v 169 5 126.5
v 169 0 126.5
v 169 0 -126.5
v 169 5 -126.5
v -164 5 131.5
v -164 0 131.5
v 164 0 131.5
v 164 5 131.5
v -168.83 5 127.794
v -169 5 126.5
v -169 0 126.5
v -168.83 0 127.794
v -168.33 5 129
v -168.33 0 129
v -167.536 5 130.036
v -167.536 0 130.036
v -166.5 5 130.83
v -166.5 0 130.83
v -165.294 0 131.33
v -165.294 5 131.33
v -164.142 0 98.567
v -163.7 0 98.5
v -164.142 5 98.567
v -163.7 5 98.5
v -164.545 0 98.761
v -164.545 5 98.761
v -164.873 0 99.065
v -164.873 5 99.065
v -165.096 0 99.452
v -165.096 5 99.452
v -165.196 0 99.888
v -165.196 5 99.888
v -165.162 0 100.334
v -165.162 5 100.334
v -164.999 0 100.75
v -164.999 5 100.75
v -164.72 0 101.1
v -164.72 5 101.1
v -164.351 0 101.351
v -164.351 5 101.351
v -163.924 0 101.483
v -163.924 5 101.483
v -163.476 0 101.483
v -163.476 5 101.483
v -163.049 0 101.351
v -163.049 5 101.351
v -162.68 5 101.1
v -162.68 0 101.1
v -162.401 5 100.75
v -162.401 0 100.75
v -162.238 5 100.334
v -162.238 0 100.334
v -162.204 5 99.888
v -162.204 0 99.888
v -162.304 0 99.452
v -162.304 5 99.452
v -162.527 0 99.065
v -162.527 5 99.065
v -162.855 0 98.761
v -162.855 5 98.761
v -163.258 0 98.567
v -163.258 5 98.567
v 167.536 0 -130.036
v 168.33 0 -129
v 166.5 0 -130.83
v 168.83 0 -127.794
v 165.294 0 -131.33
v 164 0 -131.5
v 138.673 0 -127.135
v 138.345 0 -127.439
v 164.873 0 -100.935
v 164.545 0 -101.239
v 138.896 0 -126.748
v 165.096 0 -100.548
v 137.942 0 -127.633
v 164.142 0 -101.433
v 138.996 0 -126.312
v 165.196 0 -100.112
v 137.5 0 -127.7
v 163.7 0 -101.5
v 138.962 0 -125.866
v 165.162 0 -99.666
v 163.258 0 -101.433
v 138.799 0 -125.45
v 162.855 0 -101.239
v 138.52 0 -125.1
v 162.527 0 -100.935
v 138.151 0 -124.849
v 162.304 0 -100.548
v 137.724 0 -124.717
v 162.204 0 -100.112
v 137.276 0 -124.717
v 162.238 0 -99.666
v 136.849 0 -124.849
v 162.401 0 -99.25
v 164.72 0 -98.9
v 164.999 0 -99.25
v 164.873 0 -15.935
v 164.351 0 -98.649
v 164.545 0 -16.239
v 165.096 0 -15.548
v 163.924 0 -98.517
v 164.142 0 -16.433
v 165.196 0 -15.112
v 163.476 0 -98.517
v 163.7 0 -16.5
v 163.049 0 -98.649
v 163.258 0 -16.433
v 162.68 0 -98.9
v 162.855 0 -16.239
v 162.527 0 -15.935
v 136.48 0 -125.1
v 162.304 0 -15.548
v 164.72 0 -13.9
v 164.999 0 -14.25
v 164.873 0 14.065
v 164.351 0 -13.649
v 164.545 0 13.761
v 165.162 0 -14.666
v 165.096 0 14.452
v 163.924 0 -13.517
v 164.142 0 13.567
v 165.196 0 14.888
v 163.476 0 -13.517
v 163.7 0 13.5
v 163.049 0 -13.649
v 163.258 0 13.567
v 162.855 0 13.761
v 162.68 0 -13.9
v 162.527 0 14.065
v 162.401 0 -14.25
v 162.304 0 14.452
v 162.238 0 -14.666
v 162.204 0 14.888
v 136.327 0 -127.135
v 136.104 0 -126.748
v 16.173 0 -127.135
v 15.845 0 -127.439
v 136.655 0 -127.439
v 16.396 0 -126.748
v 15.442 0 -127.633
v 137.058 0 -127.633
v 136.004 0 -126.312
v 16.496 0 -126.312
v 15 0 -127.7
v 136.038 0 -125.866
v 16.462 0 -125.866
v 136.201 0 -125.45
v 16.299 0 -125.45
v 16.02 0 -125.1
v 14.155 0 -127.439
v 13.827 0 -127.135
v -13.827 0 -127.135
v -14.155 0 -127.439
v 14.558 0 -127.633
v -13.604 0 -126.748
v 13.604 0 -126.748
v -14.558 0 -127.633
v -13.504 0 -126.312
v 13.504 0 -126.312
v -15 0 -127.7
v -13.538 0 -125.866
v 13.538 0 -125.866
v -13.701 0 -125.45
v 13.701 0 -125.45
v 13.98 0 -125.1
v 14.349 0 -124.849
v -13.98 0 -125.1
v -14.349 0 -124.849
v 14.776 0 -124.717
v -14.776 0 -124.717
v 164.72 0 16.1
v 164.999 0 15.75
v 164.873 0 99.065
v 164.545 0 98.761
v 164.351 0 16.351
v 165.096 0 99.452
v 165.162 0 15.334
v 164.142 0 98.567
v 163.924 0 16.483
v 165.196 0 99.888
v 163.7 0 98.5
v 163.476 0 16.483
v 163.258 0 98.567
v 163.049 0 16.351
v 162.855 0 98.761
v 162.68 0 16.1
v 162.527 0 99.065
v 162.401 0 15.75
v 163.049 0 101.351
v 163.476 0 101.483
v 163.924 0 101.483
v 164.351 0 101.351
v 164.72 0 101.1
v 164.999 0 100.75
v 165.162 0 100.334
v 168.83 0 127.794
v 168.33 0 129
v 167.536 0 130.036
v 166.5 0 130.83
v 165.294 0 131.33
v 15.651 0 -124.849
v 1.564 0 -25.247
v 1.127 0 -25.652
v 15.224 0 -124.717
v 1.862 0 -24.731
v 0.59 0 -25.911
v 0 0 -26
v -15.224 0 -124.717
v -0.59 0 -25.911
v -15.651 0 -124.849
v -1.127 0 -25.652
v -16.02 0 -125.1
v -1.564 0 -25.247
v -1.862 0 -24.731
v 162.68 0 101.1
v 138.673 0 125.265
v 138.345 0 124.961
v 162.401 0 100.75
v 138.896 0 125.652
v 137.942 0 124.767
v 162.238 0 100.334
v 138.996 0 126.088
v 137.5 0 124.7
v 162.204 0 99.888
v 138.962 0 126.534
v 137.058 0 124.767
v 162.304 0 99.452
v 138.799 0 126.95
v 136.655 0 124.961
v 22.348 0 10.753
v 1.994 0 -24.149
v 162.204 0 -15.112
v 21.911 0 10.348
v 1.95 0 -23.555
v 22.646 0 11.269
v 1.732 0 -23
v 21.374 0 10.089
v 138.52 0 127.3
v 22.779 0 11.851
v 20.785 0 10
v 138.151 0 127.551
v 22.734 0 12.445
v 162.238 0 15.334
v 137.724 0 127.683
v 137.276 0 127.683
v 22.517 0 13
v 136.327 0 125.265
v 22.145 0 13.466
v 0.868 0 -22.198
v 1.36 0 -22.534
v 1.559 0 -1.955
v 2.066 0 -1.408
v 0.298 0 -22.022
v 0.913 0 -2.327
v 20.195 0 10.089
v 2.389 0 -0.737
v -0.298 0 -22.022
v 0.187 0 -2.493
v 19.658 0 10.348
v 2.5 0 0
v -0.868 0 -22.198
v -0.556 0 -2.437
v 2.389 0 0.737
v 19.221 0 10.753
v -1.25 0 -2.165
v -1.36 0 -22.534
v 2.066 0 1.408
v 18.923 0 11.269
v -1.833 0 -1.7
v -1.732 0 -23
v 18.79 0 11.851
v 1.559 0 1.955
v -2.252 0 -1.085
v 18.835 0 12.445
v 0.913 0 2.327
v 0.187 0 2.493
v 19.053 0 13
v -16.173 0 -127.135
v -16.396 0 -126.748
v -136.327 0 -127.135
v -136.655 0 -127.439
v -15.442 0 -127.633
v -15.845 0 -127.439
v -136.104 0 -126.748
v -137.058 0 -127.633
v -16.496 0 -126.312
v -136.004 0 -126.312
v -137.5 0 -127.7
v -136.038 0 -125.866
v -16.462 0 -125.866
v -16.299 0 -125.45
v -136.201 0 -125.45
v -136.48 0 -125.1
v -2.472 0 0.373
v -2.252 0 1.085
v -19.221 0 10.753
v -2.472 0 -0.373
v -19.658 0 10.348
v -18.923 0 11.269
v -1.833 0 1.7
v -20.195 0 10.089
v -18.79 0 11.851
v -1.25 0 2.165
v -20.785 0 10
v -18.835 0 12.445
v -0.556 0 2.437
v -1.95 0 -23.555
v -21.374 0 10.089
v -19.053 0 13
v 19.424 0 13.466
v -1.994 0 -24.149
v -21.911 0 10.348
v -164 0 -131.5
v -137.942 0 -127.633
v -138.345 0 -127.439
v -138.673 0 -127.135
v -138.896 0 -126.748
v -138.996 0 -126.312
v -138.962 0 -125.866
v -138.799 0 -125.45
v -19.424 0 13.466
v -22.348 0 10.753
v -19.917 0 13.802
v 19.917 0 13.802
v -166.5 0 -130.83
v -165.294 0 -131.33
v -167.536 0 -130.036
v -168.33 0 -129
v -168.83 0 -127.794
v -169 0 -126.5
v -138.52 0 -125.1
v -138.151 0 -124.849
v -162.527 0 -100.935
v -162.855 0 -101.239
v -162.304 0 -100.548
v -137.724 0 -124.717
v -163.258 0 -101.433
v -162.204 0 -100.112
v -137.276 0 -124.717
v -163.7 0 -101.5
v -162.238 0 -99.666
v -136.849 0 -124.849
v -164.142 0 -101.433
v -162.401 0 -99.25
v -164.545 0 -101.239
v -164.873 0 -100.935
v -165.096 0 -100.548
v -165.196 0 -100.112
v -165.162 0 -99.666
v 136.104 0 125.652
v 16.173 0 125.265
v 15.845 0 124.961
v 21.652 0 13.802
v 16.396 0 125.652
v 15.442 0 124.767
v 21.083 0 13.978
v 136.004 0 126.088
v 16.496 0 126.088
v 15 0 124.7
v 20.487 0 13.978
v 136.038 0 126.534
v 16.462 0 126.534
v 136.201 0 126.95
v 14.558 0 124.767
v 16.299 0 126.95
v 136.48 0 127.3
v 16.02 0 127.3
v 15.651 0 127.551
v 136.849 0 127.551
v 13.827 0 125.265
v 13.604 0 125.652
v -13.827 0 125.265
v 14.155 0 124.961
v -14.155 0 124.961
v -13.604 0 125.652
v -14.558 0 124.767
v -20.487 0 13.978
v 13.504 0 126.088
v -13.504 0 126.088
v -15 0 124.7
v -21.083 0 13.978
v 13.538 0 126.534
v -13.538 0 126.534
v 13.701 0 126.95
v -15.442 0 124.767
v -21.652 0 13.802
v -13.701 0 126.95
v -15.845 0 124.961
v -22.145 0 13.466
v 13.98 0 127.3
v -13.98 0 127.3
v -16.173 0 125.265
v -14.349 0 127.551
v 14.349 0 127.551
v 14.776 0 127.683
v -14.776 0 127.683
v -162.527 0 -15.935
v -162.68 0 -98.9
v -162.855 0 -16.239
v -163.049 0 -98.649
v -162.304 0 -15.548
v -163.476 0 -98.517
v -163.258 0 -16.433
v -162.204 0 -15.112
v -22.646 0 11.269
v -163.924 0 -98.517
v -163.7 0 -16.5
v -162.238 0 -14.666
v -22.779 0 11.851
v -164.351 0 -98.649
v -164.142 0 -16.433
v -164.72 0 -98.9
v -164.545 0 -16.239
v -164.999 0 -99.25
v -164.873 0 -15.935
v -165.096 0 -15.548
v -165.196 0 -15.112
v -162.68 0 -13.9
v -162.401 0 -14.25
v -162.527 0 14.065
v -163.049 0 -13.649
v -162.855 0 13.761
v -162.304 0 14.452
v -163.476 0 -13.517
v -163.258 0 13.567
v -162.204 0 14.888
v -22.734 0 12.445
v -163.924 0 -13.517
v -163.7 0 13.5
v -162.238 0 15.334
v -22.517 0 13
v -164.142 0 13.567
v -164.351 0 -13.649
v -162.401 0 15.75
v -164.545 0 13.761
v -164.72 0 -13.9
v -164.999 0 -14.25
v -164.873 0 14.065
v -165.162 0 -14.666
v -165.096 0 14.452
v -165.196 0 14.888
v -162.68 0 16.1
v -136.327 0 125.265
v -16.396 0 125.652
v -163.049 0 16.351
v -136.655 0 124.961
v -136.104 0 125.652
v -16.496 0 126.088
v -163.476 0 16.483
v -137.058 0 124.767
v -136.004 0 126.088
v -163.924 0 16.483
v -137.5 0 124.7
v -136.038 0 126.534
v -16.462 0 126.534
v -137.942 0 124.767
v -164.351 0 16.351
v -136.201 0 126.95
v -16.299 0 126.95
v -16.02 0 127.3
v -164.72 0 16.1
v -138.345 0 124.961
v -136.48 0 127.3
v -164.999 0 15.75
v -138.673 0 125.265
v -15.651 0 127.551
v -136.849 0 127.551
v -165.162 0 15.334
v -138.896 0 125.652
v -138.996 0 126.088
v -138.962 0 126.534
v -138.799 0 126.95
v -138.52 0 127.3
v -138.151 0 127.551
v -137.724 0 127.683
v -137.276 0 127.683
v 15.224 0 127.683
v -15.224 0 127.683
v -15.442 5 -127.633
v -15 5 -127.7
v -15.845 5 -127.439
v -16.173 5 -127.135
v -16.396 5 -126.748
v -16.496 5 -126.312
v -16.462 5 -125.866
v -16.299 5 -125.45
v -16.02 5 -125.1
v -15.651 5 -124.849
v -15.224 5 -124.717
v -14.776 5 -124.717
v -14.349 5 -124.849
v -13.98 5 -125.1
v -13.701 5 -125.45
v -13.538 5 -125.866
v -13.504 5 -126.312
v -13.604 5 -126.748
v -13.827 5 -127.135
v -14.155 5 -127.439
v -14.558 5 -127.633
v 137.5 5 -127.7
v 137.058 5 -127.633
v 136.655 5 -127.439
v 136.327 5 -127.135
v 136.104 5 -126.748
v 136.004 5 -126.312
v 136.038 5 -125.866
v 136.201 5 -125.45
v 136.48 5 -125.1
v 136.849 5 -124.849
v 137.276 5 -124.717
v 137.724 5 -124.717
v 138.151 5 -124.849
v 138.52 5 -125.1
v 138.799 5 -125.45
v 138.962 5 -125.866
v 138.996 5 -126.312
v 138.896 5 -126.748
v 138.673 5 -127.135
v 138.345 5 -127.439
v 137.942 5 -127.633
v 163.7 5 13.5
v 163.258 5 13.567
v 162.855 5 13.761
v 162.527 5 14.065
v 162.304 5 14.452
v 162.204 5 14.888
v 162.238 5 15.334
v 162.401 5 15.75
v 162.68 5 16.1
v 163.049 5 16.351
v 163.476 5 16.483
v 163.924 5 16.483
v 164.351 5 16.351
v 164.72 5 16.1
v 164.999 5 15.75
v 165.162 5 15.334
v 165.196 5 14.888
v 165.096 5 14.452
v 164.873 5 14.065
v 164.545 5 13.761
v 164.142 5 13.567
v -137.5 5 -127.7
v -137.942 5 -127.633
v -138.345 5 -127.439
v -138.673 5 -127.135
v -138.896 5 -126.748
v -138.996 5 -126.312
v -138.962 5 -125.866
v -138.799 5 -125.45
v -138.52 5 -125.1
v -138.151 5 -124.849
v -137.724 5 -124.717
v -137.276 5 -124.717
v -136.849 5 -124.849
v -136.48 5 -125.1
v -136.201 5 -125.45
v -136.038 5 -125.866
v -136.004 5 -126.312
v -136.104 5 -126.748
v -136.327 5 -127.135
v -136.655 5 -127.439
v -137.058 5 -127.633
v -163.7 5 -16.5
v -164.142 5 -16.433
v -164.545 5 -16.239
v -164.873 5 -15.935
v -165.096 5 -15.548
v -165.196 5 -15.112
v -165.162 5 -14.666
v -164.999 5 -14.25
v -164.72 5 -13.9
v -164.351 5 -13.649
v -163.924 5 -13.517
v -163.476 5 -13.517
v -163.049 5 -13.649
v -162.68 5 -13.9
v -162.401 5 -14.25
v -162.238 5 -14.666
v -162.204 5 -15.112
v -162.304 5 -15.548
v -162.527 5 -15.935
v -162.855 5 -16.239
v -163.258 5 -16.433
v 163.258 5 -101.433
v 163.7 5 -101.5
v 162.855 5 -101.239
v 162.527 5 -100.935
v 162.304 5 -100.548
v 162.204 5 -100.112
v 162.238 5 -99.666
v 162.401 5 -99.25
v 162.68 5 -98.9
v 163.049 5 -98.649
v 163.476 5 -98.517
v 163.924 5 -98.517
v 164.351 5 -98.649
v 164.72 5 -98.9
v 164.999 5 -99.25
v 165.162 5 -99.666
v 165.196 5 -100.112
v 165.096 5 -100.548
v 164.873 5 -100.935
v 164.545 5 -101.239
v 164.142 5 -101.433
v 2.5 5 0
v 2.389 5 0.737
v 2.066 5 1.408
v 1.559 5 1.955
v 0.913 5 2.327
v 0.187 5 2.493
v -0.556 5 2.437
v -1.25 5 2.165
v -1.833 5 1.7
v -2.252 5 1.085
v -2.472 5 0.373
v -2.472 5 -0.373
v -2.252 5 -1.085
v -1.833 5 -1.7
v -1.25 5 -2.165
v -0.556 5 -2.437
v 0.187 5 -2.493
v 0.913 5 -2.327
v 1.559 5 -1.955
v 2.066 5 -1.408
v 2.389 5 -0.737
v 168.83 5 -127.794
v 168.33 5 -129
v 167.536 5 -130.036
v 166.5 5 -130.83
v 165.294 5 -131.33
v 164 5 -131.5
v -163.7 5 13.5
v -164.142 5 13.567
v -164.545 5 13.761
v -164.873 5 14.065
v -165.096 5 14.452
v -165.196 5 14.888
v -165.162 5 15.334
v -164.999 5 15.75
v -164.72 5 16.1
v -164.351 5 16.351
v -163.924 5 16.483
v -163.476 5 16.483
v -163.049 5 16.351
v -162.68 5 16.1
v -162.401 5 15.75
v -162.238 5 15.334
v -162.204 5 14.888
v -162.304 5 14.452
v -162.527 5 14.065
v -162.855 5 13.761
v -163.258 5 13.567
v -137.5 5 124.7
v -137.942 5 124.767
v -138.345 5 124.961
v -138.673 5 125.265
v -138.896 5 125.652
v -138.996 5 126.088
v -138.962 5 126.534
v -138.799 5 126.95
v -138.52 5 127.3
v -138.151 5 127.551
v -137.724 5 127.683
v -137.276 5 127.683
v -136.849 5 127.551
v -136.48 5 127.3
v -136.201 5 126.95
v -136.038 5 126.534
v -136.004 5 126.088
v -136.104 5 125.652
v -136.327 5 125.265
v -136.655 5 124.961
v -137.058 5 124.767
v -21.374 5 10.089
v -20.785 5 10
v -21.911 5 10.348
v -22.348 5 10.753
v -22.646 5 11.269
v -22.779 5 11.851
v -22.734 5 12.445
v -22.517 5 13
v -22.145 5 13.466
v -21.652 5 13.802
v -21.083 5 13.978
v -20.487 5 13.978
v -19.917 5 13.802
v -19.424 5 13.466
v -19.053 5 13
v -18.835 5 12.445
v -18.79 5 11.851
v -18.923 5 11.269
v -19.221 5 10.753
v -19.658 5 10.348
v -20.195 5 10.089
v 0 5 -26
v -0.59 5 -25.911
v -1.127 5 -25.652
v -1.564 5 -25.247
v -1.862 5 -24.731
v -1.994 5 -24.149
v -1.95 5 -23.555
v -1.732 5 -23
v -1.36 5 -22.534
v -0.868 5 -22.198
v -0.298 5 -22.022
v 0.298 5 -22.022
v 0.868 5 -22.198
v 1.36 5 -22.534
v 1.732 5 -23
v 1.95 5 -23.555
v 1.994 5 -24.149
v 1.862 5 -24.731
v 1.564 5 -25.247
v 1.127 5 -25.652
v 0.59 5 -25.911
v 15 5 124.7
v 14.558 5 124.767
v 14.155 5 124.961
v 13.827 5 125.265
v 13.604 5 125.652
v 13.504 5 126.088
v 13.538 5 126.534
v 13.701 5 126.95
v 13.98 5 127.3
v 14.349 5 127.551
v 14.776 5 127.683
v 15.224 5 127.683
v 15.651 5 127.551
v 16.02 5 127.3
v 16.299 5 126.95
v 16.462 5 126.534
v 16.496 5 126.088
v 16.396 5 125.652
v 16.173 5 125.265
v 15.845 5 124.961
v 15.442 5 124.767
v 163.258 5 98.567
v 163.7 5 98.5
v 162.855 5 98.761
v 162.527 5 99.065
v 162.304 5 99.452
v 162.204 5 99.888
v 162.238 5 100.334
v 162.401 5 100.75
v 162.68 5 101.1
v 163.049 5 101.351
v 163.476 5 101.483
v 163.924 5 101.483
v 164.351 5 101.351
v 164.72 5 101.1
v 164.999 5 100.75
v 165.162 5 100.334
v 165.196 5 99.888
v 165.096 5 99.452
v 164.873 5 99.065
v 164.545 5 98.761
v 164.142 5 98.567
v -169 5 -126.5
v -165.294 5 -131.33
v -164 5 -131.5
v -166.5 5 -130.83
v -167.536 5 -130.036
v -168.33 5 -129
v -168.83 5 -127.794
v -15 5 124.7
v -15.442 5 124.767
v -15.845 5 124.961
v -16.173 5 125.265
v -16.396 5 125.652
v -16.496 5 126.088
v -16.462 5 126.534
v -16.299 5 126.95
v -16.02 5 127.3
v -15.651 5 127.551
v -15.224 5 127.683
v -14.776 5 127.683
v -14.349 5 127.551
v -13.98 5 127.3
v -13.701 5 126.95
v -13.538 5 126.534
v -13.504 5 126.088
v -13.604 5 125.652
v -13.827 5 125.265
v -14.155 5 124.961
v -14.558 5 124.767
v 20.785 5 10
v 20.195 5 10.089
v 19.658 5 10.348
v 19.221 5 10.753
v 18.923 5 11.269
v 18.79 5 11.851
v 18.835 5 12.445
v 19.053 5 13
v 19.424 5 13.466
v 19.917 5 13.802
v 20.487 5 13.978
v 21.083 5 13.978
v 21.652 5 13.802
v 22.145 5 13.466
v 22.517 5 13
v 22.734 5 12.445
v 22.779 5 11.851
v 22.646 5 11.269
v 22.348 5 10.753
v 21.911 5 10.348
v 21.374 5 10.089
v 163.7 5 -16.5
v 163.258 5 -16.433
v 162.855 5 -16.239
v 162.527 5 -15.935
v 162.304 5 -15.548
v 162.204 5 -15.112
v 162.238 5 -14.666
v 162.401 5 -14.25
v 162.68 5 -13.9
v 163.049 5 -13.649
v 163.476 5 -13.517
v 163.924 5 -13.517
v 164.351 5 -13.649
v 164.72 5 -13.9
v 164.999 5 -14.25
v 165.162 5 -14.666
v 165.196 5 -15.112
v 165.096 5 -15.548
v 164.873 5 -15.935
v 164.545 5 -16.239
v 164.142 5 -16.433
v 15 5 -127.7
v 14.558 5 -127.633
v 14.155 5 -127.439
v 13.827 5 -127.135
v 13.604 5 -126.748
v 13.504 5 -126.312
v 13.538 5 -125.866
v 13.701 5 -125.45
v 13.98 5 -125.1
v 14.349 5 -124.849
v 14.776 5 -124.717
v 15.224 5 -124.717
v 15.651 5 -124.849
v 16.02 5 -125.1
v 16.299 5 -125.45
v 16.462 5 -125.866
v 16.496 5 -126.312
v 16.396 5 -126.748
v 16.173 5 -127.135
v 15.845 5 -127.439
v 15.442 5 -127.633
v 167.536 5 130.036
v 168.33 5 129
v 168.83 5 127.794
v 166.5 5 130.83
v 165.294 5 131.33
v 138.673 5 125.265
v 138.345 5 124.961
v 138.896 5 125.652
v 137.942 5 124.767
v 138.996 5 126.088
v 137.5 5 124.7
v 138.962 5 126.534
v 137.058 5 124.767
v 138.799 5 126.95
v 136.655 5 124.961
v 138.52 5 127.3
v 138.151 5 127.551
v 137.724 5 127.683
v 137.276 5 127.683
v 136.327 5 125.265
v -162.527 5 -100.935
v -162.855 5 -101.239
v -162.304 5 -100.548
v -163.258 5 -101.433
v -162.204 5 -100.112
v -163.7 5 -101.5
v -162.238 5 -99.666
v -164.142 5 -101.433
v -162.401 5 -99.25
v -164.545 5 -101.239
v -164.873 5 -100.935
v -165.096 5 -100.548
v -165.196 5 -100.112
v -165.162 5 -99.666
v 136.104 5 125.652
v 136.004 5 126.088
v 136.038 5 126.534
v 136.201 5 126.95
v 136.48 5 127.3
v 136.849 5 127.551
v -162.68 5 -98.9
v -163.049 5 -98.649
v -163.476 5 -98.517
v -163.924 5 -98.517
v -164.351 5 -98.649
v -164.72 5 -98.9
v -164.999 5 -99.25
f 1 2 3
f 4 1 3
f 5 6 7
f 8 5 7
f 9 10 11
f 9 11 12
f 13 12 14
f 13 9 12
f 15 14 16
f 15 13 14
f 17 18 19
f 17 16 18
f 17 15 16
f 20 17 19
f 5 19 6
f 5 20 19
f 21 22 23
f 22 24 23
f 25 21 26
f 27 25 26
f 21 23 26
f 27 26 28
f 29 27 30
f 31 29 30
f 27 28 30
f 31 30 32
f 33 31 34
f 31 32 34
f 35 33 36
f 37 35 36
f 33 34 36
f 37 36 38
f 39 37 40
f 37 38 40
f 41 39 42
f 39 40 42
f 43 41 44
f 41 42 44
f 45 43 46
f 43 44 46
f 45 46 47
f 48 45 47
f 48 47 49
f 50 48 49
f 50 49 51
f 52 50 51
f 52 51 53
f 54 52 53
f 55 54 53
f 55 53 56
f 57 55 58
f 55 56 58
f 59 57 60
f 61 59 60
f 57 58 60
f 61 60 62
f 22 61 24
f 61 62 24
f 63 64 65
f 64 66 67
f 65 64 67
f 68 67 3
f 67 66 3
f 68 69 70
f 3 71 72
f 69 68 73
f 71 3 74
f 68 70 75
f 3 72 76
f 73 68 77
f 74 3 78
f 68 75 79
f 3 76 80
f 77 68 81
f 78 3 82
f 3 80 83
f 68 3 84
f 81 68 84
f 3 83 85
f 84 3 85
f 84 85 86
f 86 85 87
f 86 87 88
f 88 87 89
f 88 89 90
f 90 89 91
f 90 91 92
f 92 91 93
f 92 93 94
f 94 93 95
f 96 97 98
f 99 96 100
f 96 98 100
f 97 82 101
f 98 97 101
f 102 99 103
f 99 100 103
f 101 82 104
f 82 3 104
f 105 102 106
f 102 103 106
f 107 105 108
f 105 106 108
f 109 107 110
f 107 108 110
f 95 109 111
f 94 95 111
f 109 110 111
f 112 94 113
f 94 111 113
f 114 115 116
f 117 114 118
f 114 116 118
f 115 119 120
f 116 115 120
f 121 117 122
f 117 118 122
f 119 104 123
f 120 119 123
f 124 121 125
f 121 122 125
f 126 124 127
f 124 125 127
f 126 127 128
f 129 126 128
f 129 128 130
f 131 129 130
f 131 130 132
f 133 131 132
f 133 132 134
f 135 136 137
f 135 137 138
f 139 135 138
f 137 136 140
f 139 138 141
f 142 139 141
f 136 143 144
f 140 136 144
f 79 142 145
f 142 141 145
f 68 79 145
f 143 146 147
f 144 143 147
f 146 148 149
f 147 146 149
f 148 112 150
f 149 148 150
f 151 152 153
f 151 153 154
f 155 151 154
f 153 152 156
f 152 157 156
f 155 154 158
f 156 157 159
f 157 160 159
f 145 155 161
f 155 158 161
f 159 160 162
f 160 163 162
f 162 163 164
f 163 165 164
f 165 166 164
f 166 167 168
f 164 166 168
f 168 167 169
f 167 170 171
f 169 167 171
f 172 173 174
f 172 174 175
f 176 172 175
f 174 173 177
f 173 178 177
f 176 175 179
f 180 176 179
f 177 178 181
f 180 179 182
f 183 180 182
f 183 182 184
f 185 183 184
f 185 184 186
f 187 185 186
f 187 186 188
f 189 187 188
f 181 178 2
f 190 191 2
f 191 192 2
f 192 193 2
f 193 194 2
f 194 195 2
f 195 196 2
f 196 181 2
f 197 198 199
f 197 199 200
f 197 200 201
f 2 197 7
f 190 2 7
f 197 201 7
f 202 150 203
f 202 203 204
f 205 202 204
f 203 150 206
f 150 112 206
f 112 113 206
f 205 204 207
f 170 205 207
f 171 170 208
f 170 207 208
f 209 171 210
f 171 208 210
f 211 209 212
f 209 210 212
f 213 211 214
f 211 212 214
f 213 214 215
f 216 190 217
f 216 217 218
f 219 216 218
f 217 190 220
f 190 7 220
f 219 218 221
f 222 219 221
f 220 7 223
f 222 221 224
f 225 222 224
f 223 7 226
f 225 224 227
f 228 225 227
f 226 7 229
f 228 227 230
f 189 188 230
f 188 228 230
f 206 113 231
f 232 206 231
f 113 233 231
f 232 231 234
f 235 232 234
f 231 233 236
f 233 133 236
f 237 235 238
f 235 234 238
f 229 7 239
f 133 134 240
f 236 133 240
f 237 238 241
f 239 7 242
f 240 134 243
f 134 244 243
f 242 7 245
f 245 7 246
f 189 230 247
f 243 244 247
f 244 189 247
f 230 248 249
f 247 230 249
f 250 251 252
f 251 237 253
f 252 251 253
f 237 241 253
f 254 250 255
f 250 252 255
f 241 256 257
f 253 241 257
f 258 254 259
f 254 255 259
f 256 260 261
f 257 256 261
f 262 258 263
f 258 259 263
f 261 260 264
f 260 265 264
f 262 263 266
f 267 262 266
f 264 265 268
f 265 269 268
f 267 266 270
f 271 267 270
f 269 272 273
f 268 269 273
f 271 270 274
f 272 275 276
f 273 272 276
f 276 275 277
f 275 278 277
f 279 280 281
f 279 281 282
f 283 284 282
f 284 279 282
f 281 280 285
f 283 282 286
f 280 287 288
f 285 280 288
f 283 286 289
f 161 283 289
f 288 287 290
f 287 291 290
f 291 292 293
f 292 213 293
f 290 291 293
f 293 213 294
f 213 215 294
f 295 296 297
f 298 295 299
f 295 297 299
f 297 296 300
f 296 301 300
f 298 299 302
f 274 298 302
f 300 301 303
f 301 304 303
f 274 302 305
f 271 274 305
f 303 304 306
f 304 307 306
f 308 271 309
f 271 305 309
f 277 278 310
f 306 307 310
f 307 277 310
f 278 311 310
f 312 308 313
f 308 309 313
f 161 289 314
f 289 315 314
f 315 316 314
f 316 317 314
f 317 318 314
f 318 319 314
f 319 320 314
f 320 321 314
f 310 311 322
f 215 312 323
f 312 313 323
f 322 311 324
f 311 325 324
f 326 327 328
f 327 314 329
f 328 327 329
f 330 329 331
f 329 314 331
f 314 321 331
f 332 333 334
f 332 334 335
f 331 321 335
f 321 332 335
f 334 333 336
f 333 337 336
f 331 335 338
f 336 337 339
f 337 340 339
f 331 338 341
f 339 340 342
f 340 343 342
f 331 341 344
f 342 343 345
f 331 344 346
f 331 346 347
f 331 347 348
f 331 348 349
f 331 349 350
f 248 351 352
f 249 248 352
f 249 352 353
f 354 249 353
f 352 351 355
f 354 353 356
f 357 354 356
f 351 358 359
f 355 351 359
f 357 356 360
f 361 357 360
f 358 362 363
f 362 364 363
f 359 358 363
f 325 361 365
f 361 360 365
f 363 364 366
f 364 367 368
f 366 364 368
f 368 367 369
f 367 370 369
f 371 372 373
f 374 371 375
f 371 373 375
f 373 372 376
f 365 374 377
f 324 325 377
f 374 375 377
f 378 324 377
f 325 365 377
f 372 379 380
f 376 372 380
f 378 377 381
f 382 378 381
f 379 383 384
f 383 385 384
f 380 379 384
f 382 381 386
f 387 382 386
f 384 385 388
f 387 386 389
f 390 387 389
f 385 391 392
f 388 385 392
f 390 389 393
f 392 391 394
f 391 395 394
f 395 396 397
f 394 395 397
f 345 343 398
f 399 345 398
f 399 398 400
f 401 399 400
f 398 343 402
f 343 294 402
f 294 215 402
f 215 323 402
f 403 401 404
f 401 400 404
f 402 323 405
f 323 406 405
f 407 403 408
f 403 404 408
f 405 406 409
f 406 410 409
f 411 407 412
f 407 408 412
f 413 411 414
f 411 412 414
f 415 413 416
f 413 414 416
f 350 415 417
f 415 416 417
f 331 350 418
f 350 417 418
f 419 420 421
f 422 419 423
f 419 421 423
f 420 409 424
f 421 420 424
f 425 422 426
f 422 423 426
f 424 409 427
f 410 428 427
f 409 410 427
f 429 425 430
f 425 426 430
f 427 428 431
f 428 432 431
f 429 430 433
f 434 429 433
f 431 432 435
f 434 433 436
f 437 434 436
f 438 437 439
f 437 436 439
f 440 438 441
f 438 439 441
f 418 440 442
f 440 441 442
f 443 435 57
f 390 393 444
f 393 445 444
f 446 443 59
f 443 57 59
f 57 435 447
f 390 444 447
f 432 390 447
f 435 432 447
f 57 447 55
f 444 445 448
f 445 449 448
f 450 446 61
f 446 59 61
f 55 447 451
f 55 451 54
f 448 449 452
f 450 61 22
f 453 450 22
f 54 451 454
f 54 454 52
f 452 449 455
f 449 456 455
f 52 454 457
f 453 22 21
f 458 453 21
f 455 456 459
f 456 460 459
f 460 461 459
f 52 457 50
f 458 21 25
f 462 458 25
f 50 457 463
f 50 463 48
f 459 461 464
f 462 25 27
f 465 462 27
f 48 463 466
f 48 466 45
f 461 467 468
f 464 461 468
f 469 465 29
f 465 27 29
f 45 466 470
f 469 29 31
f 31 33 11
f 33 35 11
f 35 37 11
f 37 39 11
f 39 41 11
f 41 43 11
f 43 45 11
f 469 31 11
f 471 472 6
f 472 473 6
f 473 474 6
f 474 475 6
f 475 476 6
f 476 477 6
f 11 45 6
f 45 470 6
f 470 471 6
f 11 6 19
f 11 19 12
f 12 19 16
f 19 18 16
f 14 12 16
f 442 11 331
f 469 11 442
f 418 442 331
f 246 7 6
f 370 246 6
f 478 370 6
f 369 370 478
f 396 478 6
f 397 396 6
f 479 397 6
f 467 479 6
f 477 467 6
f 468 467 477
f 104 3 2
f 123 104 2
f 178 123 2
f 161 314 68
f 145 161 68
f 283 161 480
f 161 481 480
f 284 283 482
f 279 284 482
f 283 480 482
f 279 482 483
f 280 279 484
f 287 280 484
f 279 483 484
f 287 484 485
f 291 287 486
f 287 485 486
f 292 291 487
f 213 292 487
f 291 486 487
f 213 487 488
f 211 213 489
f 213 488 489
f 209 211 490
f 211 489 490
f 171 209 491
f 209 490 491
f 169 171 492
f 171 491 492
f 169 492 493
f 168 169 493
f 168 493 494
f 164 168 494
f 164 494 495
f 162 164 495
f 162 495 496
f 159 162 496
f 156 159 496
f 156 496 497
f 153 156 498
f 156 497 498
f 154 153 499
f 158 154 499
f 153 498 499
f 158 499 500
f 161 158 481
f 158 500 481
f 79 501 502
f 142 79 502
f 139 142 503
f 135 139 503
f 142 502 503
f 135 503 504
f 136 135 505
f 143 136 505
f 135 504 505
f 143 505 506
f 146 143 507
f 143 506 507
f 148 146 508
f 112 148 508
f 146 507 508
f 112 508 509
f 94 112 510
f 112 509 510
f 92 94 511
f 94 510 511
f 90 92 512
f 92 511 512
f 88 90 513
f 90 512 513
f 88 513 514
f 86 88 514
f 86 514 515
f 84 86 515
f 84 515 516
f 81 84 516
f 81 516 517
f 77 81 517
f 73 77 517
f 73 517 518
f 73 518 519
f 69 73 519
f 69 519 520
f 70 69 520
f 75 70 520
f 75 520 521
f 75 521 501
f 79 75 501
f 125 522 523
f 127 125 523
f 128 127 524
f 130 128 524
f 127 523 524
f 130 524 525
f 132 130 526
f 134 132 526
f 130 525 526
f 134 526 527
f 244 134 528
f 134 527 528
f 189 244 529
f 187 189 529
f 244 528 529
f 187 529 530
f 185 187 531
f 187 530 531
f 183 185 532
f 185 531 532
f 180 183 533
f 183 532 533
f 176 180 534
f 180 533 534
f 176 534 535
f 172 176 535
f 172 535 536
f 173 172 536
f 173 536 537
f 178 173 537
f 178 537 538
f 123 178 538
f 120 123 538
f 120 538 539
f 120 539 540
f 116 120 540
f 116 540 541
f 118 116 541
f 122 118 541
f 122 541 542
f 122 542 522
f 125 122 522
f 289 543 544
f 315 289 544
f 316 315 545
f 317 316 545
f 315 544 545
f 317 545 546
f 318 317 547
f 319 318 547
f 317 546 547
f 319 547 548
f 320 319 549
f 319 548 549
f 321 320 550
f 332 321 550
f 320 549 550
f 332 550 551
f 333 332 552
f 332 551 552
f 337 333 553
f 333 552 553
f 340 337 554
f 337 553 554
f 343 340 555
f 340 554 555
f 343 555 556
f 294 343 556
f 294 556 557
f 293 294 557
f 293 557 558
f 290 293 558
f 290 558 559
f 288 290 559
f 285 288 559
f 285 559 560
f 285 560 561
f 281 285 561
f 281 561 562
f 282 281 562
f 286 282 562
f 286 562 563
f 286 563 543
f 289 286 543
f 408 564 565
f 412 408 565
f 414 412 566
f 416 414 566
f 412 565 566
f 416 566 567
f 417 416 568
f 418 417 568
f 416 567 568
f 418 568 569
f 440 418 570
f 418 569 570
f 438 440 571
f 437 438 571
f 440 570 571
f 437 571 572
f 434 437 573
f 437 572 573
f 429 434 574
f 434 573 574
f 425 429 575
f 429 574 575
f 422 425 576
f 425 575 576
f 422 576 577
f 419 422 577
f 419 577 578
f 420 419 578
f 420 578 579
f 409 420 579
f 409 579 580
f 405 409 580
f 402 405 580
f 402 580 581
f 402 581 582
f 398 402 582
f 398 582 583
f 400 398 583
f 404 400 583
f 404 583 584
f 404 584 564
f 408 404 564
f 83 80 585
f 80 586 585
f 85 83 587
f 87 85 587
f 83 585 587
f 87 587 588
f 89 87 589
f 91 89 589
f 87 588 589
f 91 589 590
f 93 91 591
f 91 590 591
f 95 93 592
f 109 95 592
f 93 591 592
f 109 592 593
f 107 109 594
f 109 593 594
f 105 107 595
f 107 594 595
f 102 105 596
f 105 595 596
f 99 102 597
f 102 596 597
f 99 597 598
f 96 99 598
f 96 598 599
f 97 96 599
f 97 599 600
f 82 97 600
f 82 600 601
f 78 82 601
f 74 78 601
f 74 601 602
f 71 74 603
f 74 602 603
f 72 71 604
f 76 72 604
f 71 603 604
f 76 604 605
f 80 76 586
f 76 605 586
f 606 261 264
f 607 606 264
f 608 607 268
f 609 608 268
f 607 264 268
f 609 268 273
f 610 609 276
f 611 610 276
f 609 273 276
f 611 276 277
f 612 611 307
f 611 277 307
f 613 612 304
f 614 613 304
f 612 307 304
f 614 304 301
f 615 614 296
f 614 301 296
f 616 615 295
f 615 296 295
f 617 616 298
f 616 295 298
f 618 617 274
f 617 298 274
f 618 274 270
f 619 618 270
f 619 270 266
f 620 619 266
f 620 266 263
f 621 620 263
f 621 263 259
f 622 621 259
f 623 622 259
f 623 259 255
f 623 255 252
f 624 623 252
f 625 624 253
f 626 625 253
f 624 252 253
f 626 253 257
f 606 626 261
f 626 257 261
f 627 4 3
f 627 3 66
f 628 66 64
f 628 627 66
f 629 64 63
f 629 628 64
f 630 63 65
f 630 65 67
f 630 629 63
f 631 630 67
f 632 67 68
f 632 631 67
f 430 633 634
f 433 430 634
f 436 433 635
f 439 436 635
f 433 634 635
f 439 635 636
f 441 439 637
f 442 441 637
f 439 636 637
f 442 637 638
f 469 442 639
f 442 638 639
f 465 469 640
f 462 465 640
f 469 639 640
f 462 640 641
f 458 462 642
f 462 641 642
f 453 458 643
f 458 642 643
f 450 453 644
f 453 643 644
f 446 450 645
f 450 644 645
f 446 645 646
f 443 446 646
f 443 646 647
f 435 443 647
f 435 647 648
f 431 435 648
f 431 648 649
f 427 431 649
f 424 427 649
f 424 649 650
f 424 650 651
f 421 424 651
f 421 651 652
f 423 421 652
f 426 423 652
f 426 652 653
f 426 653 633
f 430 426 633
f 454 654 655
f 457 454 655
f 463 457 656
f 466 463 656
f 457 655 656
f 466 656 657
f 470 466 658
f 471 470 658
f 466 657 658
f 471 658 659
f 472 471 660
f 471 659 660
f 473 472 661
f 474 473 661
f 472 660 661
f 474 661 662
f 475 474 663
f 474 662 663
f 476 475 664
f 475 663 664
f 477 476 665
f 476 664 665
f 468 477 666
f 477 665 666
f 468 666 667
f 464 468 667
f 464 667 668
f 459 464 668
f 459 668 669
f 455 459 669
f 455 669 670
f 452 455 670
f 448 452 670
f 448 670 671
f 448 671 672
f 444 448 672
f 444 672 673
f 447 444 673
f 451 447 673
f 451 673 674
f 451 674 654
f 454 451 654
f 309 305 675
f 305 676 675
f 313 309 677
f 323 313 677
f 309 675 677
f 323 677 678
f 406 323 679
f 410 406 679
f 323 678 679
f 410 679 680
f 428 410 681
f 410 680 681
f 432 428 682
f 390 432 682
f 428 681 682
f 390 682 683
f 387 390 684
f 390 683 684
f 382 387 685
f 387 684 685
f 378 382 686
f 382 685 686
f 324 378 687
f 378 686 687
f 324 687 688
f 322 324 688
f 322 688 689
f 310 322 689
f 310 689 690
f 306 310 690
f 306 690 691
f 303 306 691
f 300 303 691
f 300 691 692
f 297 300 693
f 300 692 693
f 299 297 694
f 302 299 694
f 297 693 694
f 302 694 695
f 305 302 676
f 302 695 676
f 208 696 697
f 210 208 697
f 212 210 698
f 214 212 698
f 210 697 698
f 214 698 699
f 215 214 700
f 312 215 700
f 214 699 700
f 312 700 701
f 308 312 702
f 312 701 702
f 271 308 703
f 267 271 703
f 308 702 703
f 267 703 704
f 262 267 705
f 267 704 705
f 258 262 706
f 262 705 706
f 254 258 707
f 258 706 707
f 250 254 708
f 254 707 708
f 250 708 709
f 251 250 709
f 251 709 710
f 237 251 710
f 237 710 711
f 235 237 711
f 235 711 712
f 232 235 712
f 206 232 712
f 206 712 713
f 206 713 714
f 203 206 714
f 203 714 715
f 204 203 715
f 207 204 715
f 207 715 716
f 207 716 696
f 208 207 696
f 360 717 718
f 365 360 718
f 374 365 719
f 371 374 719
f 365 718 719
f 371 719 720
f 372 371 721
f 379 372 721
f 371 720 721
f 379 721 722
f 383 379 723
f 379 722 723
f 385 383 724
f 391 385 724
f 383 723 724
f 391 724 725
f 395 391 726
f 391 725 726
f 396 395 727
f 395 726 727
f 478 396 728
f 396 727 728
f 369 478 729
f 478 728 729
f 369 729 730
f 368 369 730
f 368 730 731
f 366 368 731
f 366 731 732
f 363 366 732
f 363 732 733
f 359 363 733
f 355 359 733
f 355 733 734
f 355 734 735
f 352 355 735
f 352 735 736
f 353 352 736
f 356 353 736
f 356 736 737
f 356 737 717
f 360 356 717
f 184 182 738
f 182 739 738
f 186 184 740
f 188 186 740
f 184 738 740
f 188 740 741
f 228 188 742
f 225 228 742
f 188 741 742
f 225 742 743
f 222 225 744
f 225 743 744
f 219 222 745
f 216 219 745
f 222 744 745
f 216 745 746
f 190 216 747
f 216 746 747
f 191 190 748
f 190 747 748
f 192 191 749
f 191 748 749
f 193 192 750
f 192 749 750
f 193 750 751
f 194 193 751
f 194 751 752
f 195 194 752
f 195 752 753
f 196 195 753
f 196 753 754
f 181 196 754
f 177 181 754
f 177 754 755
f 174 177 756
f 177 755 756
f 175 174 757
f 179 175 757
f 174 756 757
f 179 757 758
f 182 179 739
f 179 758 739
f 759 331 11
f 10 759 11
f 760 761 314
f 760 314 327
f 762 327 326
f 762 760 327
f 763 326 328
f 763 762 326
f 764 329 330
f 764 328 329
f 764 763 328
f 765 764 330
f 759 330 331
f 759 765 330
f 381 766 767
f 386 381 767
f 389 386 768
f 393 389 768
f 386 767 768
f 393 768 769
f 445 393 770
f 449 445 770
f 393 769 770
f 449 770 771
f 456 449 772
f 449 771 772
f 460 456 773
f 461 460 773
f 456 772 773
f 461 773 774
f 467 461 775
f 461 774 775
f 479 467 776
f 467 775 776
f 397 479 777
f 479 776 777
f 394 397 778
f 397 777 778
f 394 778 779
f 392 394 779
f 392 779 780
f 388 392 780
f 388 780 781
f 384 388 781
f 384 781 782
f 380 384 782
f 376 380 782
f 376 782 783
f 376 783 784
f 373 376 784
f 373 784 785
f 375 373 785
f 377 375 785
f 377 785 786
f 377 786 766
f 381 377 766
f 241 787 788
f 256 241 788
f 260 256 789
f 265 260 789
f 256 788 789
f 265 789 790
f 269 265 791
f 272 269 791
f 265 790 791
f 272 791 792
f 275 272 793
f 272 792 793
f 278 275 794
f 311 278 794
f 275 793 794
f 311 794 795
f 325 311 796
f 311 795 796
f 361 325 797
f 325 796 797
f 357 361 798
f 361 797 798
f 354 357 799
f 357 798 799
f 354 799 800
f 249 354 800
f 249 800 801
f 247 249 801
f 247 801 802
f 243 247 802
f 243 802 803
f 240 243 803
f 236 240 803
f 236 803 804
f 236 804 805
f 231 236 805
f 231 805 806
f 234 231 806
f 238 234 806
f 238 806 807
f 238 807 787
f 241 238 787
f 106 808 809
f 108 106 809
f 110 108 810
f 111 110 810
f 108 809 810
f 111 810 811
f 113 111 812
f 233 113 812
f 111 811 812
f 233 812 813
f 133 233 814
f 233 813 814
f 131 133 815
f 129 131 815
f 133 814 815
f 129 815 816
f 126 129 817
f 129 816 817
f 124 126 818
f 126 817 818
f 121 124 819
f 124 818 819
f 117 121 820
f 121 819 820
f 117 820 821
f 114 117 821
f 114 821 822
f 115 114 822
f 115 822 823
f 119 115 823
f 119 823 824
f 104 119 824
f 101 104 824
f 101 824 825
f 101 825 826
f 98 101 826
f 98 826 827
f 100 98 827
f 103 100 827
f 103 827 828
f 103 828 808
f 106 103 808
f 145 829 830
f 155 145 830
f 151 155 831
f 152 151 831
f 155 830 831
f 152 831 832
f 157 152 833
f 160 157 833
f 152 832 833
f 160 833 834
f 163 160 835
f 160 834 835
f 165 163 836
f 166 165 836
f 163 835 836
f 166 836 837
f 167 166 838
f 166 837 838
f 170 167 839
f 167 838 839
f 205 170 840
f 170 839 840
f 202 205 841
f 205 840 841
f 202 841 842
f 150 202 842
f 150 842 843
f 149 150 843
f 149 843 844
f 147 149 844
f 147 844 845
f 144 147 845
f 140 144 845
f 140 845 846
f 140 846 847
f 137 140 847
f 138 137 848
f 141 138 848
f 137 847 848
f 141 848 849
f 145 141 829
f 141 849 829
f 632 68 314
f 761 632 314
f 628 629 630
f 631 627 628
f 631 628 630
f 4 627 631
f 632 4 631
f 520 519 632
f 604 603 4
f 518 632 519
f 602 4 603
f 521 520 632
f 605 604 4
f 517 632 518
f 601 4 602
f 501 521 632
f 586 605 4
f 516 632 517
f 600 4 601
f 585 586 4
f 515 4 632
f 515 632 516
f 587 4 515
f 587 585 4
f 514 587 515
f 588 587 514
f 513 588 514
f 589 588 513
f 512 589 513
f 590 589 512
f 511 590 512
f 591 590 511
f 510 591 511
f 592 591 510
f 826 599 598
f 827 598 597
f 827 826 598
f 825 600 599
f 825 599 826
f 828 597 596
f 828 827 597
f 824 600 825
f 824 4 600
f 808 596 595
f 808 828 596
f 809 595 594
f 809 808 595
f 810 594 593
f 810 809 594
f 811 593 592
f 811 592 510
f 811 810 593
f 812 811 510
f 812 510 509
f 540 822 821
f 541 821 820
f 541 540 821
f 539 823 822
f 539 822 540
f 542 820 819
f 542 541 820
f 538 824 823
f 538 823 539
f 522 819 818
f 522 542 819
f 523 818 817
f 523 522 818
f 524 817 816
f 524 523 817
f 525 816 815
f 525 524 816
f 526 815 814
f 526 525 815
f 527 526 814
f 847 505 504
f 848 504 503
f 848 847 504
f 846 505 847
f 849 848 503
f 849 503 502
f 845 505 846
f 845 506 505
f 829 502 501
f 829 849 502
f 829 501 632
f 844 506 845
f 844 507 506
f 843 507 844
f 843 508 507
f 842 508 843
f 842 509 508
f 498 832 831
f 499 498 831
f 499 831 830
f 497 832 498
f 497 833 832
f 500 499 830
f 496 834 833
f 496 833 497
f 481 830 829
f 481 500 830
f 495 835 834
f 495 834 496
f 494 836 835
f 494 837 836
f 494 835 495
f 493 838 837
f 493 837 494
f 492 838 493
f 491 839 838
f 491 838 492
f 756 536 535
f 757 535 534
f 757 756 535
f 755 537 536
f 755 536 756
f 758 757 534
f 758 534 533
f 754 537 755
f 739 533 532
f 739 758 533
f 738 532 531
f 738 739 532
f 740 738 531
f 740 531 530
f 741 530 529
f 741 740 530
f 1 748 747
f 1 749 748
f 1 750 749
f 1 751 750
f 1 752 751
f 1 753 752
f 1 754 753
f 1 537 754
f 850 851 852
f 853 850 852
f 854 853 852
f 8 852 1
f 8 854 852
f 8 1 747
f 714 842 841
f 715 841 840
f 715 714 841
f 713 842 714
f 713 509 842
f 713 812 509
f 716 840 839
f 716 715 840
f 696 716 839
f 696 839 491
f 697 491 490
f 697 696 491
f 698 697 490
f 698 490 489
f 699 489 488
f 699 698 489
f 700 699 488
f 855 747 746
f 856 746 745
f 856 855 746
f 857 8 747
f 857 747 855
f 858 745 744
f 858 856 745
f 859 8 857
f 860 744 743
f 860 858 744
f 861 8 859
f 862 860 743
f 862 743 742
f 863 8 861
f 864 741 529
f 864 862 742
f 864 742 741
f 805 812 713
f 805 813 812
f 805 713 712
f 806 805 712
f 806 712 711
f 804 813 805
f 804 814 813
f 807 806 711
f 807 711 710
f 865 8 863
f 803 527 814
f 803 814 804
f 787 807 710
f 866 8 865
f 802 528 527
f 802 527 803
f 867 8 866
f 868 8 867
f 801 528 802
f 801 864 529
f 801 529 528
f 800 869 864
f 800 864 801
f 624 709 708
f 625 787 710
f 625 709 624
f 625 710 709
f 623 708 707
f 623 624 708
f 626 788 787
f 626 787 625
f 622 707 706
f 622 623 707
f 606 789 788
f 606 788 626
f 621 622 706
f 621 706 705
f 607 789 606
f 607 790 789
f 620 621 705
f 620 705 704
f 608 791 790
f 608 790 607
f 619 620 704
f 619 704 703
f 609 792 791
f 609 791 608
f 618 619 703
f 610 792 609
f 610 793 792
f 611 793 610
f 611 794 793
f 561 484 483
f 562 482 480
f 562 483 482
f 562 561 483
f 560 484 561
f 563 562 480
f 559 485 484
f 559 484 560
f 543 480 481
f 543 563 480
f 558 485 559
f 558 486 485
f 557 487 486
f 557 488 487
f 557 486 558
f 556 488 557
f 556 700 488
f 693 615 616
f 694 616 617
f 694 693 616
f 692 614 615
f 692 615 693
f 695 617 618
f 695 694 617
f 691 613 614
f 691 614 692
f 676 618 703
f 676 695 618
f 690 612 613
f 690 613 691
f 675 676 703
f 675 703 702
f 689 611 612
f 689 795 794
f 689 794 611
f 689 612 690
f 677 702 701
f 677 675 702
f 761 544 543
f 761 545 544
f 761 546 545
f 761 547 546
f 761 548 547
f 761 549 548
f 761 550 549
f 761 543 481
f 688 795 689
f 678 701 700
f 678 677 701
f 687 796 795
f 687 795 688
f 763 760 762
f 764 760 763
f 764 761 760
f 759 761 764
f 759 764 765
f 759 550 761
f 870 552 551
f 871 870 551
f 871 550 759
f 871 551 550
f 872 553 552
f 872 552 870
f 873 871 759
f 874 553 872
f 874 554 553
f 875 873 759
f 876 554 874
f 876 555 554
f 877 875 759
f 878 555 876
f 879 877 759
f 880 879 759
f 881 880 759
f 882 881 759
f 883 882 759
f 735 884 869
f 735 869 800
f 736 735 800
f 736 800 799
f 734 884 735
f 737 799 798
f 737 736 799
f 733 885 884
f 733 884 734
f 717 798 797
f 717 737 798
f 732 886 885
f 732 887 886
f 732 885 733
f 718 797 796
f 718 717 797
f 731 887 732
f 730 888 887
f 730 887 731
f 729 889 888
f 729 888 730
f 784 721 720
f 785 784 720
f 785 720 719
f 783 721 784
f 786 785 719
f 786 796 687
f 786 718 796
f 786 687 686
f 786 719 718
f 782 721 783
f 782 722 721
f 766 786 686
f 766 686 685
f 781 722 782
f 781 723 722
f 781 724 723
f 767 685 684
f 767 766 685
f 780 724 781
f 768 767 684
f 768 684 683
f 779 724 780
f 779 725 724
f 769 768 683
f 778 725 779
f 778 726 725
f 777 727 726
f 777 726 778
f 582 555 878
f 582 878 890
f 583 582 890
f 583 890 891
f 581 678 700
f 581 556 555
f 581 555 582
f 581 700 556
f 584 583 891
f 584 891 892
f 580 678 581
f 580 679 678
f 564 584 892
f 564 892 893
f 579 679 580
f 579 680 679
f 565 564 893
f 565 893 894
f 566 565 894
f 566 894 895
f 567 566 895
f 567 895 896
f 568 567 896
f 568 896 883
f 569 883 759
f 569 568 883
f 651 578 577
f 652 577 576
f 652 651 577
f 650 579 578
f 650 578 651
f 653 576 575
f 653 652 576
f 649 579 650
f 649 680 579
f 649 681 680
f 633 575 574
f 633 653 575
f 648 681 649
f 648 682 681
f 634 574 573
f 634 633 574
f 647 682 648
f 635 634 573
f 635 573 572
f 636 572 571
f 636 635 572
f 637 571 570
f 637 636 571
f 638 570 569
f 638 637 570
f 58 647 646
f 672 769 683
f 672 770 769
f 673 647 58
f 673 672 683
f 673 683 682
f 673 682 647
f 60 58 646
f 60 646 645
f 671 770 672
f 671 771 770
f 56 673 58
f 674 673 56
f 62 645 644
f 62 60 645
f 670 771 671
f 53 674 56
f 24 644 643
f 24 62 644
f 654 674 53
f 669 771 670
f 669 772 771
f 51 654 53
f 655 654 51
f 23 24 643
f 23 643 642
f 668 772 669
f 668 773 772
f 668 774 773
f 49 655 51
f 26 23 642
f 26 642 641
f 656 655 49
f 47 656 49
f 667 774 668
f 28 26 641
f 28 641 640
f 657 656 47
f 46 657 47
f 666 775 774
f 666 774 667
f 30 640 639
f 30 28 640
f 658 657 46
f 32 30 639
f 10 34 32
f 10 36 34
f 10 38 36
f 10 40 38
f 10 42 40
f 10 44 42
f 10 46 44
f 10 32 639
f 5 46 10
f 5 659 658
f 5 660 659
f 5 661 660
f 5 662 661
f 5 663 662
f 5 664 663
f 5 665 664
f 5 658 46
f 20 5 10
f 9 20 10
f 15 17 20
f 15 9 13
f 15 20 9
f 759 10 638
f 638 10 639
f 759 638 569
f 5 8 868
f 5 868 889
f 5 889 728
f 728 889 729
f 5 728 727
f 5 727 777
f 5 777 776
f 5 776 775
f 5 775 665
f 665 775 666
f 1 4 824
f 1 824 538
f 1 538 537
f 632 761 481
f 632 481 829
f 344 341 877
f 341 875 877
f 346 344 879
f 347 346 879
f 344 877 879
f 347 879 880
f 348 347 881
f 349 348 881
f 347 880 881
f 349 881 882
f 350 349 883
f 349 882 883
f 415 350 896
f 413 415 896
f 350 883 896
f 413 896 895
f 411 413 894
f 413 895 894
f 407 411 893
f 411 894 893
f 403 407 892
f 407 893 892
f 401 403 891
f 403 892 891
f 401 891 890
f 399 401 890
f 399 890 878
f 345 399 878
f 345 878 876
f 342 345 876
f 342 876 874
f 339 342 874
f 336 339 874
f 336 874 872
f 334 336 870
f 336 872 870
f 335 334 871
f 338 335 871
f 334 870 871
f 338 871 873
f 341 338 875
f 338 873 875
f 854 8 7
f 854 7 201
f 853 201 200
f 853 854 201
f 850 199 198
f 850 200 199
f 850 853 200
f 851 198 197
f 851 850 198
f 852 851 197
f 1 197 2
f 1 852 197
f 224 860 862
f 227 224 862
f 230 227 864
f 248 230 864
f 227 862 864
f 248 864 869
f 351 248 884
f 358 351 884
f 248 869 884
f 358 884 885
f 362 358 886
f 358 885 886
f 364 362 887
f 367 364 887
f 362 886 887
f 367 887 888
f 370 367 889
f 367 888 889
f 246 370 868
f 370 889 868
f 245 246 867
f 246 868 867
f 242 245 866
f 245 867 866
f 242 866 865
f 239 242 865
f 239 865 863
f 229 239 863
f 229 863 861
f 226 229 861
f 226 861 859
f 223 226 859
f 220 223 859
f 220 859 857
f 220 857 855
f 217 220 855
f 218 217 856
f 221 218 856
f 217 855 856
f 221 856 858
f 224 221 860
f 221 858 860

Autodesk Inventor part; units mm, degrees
ref_plane "YZ Plane" through (0, 0, 0) normal (1, 0, 0) x (0, 1, 0)
ref_plane "XZ Plane" through (0, 0, 0) normal (0, 1, 0) x (-1, 0, 0)
ref_plane "XY Plane" through (0, 0, 0) normal (0, 0, 1) x (1, 0, 0)
sketch "Szkic1" plane through (0, 0, 0) normal (0, 1, 0) x (-1, 0, 0)
  line L0 (-169, -131.5) -> (169, -131.5)
  line L1 (169, -131.5) -> (169, 131.5)
  line L2 (169, 131.5) -> (-169, 131.5)
  line L3 (-169, 131.5) -> (-169, -131.5)
  line L4 (-169, -131.5) -> (169, 131.5) construction
  line L5 (169, -131.5) -> (-169, 131.5) construction
  point P0 (0, 0)
  dimension "d0" = 338
  dimension "d1" = 263
extrude "Wyciągnięcie proste1" add sketch "Szkic1" along normal blind 5
fillet "Zaokrąglenie1" radius 5 4 edges at (-169, 2.5, -131.5) (169, 2.5, -131.5) (-169, 2.5, 131.5) (169, 2.5, 131.5)
sketch "Szkic2" plane through (0, 0, 0) normal (0, -1, 0) x (1, 0, 0)
  circle A0 centre (-137.5, 126.2) radius 1.65 projected
  circle A1 centre (-163.7, 100) radius 1.65 projected
  circle A2 centre (-163.7, 15) radius 1.65 projected
  circle A3 centre (-163.7, -15) radius 1.65 projected
  circle A4 centre (-163.7, -100) radius 1.65 projected
  circle A5 centre (-137.5, -126.2) radius 1.65 projected
  circle A6 centre (-15, -126.2) radius 1.65 projected
  circle A7 centre (15, -126.2) radius 1.65 projected
  circle A8 centre (-20.7846, 12) radius 2.25 projected
  circle A9 centre (0, -24) radius 2.25 projected
  circle A10 centre (20.7846, 12) radius 2.25 projected
  circle A11 centre (137.5, -126.2) radius 1.65 projected
  circle A12 centre (163.7, -100) radius 1.65 projected
  circle A13 centre (163.7, -15) radius 1.65 projected
  circle A14 centre (163.7, 15) radius 1.65 projected
  circle A15 centre (163.7, 100) radius 1.65 projected
  circle A16 centre (137.5, 126.2) radius 1.65 projected
  circle A17 centre (15, 126.2) radius 1.65 projected
  circle A18 centre (-15, 126.2) radius 1.65 projected
  point P0 (0, 0)
hole "Otwór2" at (20.7846, 0, 12) at (-20.7846, 0, 12) at (0, 0, -24) direction (0, 1, 0) diameter 4 end through all
hole "Otwór1" at (137.5, 0, -126.2) at (163.7, 0, -100) at (163.7, 0, -15) at (163.7, 0, 15) at (163.7, 0, 100) at (137.5, 0, 126.2) at (15, 0, 126.2) at (-15, 0, 126.2) at (-137.5, 0, 126.2) at (-163.7, 0, 100) at (-163.7, 0, 15) at (-163.7, 0, -15) at (-163.7, 0, -100) at (-137.5, 0, -126.2) at (-15, 0, -126.2) at (15, 0, -126.2) direction (0, 1, 0) diameter 3 end through all
sketch "Szkic3" plane through (0, 0, 0) normal (0, -1, 0) x (1, 0, 0)
  circle A0 centre (0, 0) radius 2.5
  dimension "d27" = 5
extrude "Wyciągnięcie proste3" cut sketch "Szkic3" against normal through all
properties part number "frame_lowerl" material "Tworzywo sztuczne PMMA"
